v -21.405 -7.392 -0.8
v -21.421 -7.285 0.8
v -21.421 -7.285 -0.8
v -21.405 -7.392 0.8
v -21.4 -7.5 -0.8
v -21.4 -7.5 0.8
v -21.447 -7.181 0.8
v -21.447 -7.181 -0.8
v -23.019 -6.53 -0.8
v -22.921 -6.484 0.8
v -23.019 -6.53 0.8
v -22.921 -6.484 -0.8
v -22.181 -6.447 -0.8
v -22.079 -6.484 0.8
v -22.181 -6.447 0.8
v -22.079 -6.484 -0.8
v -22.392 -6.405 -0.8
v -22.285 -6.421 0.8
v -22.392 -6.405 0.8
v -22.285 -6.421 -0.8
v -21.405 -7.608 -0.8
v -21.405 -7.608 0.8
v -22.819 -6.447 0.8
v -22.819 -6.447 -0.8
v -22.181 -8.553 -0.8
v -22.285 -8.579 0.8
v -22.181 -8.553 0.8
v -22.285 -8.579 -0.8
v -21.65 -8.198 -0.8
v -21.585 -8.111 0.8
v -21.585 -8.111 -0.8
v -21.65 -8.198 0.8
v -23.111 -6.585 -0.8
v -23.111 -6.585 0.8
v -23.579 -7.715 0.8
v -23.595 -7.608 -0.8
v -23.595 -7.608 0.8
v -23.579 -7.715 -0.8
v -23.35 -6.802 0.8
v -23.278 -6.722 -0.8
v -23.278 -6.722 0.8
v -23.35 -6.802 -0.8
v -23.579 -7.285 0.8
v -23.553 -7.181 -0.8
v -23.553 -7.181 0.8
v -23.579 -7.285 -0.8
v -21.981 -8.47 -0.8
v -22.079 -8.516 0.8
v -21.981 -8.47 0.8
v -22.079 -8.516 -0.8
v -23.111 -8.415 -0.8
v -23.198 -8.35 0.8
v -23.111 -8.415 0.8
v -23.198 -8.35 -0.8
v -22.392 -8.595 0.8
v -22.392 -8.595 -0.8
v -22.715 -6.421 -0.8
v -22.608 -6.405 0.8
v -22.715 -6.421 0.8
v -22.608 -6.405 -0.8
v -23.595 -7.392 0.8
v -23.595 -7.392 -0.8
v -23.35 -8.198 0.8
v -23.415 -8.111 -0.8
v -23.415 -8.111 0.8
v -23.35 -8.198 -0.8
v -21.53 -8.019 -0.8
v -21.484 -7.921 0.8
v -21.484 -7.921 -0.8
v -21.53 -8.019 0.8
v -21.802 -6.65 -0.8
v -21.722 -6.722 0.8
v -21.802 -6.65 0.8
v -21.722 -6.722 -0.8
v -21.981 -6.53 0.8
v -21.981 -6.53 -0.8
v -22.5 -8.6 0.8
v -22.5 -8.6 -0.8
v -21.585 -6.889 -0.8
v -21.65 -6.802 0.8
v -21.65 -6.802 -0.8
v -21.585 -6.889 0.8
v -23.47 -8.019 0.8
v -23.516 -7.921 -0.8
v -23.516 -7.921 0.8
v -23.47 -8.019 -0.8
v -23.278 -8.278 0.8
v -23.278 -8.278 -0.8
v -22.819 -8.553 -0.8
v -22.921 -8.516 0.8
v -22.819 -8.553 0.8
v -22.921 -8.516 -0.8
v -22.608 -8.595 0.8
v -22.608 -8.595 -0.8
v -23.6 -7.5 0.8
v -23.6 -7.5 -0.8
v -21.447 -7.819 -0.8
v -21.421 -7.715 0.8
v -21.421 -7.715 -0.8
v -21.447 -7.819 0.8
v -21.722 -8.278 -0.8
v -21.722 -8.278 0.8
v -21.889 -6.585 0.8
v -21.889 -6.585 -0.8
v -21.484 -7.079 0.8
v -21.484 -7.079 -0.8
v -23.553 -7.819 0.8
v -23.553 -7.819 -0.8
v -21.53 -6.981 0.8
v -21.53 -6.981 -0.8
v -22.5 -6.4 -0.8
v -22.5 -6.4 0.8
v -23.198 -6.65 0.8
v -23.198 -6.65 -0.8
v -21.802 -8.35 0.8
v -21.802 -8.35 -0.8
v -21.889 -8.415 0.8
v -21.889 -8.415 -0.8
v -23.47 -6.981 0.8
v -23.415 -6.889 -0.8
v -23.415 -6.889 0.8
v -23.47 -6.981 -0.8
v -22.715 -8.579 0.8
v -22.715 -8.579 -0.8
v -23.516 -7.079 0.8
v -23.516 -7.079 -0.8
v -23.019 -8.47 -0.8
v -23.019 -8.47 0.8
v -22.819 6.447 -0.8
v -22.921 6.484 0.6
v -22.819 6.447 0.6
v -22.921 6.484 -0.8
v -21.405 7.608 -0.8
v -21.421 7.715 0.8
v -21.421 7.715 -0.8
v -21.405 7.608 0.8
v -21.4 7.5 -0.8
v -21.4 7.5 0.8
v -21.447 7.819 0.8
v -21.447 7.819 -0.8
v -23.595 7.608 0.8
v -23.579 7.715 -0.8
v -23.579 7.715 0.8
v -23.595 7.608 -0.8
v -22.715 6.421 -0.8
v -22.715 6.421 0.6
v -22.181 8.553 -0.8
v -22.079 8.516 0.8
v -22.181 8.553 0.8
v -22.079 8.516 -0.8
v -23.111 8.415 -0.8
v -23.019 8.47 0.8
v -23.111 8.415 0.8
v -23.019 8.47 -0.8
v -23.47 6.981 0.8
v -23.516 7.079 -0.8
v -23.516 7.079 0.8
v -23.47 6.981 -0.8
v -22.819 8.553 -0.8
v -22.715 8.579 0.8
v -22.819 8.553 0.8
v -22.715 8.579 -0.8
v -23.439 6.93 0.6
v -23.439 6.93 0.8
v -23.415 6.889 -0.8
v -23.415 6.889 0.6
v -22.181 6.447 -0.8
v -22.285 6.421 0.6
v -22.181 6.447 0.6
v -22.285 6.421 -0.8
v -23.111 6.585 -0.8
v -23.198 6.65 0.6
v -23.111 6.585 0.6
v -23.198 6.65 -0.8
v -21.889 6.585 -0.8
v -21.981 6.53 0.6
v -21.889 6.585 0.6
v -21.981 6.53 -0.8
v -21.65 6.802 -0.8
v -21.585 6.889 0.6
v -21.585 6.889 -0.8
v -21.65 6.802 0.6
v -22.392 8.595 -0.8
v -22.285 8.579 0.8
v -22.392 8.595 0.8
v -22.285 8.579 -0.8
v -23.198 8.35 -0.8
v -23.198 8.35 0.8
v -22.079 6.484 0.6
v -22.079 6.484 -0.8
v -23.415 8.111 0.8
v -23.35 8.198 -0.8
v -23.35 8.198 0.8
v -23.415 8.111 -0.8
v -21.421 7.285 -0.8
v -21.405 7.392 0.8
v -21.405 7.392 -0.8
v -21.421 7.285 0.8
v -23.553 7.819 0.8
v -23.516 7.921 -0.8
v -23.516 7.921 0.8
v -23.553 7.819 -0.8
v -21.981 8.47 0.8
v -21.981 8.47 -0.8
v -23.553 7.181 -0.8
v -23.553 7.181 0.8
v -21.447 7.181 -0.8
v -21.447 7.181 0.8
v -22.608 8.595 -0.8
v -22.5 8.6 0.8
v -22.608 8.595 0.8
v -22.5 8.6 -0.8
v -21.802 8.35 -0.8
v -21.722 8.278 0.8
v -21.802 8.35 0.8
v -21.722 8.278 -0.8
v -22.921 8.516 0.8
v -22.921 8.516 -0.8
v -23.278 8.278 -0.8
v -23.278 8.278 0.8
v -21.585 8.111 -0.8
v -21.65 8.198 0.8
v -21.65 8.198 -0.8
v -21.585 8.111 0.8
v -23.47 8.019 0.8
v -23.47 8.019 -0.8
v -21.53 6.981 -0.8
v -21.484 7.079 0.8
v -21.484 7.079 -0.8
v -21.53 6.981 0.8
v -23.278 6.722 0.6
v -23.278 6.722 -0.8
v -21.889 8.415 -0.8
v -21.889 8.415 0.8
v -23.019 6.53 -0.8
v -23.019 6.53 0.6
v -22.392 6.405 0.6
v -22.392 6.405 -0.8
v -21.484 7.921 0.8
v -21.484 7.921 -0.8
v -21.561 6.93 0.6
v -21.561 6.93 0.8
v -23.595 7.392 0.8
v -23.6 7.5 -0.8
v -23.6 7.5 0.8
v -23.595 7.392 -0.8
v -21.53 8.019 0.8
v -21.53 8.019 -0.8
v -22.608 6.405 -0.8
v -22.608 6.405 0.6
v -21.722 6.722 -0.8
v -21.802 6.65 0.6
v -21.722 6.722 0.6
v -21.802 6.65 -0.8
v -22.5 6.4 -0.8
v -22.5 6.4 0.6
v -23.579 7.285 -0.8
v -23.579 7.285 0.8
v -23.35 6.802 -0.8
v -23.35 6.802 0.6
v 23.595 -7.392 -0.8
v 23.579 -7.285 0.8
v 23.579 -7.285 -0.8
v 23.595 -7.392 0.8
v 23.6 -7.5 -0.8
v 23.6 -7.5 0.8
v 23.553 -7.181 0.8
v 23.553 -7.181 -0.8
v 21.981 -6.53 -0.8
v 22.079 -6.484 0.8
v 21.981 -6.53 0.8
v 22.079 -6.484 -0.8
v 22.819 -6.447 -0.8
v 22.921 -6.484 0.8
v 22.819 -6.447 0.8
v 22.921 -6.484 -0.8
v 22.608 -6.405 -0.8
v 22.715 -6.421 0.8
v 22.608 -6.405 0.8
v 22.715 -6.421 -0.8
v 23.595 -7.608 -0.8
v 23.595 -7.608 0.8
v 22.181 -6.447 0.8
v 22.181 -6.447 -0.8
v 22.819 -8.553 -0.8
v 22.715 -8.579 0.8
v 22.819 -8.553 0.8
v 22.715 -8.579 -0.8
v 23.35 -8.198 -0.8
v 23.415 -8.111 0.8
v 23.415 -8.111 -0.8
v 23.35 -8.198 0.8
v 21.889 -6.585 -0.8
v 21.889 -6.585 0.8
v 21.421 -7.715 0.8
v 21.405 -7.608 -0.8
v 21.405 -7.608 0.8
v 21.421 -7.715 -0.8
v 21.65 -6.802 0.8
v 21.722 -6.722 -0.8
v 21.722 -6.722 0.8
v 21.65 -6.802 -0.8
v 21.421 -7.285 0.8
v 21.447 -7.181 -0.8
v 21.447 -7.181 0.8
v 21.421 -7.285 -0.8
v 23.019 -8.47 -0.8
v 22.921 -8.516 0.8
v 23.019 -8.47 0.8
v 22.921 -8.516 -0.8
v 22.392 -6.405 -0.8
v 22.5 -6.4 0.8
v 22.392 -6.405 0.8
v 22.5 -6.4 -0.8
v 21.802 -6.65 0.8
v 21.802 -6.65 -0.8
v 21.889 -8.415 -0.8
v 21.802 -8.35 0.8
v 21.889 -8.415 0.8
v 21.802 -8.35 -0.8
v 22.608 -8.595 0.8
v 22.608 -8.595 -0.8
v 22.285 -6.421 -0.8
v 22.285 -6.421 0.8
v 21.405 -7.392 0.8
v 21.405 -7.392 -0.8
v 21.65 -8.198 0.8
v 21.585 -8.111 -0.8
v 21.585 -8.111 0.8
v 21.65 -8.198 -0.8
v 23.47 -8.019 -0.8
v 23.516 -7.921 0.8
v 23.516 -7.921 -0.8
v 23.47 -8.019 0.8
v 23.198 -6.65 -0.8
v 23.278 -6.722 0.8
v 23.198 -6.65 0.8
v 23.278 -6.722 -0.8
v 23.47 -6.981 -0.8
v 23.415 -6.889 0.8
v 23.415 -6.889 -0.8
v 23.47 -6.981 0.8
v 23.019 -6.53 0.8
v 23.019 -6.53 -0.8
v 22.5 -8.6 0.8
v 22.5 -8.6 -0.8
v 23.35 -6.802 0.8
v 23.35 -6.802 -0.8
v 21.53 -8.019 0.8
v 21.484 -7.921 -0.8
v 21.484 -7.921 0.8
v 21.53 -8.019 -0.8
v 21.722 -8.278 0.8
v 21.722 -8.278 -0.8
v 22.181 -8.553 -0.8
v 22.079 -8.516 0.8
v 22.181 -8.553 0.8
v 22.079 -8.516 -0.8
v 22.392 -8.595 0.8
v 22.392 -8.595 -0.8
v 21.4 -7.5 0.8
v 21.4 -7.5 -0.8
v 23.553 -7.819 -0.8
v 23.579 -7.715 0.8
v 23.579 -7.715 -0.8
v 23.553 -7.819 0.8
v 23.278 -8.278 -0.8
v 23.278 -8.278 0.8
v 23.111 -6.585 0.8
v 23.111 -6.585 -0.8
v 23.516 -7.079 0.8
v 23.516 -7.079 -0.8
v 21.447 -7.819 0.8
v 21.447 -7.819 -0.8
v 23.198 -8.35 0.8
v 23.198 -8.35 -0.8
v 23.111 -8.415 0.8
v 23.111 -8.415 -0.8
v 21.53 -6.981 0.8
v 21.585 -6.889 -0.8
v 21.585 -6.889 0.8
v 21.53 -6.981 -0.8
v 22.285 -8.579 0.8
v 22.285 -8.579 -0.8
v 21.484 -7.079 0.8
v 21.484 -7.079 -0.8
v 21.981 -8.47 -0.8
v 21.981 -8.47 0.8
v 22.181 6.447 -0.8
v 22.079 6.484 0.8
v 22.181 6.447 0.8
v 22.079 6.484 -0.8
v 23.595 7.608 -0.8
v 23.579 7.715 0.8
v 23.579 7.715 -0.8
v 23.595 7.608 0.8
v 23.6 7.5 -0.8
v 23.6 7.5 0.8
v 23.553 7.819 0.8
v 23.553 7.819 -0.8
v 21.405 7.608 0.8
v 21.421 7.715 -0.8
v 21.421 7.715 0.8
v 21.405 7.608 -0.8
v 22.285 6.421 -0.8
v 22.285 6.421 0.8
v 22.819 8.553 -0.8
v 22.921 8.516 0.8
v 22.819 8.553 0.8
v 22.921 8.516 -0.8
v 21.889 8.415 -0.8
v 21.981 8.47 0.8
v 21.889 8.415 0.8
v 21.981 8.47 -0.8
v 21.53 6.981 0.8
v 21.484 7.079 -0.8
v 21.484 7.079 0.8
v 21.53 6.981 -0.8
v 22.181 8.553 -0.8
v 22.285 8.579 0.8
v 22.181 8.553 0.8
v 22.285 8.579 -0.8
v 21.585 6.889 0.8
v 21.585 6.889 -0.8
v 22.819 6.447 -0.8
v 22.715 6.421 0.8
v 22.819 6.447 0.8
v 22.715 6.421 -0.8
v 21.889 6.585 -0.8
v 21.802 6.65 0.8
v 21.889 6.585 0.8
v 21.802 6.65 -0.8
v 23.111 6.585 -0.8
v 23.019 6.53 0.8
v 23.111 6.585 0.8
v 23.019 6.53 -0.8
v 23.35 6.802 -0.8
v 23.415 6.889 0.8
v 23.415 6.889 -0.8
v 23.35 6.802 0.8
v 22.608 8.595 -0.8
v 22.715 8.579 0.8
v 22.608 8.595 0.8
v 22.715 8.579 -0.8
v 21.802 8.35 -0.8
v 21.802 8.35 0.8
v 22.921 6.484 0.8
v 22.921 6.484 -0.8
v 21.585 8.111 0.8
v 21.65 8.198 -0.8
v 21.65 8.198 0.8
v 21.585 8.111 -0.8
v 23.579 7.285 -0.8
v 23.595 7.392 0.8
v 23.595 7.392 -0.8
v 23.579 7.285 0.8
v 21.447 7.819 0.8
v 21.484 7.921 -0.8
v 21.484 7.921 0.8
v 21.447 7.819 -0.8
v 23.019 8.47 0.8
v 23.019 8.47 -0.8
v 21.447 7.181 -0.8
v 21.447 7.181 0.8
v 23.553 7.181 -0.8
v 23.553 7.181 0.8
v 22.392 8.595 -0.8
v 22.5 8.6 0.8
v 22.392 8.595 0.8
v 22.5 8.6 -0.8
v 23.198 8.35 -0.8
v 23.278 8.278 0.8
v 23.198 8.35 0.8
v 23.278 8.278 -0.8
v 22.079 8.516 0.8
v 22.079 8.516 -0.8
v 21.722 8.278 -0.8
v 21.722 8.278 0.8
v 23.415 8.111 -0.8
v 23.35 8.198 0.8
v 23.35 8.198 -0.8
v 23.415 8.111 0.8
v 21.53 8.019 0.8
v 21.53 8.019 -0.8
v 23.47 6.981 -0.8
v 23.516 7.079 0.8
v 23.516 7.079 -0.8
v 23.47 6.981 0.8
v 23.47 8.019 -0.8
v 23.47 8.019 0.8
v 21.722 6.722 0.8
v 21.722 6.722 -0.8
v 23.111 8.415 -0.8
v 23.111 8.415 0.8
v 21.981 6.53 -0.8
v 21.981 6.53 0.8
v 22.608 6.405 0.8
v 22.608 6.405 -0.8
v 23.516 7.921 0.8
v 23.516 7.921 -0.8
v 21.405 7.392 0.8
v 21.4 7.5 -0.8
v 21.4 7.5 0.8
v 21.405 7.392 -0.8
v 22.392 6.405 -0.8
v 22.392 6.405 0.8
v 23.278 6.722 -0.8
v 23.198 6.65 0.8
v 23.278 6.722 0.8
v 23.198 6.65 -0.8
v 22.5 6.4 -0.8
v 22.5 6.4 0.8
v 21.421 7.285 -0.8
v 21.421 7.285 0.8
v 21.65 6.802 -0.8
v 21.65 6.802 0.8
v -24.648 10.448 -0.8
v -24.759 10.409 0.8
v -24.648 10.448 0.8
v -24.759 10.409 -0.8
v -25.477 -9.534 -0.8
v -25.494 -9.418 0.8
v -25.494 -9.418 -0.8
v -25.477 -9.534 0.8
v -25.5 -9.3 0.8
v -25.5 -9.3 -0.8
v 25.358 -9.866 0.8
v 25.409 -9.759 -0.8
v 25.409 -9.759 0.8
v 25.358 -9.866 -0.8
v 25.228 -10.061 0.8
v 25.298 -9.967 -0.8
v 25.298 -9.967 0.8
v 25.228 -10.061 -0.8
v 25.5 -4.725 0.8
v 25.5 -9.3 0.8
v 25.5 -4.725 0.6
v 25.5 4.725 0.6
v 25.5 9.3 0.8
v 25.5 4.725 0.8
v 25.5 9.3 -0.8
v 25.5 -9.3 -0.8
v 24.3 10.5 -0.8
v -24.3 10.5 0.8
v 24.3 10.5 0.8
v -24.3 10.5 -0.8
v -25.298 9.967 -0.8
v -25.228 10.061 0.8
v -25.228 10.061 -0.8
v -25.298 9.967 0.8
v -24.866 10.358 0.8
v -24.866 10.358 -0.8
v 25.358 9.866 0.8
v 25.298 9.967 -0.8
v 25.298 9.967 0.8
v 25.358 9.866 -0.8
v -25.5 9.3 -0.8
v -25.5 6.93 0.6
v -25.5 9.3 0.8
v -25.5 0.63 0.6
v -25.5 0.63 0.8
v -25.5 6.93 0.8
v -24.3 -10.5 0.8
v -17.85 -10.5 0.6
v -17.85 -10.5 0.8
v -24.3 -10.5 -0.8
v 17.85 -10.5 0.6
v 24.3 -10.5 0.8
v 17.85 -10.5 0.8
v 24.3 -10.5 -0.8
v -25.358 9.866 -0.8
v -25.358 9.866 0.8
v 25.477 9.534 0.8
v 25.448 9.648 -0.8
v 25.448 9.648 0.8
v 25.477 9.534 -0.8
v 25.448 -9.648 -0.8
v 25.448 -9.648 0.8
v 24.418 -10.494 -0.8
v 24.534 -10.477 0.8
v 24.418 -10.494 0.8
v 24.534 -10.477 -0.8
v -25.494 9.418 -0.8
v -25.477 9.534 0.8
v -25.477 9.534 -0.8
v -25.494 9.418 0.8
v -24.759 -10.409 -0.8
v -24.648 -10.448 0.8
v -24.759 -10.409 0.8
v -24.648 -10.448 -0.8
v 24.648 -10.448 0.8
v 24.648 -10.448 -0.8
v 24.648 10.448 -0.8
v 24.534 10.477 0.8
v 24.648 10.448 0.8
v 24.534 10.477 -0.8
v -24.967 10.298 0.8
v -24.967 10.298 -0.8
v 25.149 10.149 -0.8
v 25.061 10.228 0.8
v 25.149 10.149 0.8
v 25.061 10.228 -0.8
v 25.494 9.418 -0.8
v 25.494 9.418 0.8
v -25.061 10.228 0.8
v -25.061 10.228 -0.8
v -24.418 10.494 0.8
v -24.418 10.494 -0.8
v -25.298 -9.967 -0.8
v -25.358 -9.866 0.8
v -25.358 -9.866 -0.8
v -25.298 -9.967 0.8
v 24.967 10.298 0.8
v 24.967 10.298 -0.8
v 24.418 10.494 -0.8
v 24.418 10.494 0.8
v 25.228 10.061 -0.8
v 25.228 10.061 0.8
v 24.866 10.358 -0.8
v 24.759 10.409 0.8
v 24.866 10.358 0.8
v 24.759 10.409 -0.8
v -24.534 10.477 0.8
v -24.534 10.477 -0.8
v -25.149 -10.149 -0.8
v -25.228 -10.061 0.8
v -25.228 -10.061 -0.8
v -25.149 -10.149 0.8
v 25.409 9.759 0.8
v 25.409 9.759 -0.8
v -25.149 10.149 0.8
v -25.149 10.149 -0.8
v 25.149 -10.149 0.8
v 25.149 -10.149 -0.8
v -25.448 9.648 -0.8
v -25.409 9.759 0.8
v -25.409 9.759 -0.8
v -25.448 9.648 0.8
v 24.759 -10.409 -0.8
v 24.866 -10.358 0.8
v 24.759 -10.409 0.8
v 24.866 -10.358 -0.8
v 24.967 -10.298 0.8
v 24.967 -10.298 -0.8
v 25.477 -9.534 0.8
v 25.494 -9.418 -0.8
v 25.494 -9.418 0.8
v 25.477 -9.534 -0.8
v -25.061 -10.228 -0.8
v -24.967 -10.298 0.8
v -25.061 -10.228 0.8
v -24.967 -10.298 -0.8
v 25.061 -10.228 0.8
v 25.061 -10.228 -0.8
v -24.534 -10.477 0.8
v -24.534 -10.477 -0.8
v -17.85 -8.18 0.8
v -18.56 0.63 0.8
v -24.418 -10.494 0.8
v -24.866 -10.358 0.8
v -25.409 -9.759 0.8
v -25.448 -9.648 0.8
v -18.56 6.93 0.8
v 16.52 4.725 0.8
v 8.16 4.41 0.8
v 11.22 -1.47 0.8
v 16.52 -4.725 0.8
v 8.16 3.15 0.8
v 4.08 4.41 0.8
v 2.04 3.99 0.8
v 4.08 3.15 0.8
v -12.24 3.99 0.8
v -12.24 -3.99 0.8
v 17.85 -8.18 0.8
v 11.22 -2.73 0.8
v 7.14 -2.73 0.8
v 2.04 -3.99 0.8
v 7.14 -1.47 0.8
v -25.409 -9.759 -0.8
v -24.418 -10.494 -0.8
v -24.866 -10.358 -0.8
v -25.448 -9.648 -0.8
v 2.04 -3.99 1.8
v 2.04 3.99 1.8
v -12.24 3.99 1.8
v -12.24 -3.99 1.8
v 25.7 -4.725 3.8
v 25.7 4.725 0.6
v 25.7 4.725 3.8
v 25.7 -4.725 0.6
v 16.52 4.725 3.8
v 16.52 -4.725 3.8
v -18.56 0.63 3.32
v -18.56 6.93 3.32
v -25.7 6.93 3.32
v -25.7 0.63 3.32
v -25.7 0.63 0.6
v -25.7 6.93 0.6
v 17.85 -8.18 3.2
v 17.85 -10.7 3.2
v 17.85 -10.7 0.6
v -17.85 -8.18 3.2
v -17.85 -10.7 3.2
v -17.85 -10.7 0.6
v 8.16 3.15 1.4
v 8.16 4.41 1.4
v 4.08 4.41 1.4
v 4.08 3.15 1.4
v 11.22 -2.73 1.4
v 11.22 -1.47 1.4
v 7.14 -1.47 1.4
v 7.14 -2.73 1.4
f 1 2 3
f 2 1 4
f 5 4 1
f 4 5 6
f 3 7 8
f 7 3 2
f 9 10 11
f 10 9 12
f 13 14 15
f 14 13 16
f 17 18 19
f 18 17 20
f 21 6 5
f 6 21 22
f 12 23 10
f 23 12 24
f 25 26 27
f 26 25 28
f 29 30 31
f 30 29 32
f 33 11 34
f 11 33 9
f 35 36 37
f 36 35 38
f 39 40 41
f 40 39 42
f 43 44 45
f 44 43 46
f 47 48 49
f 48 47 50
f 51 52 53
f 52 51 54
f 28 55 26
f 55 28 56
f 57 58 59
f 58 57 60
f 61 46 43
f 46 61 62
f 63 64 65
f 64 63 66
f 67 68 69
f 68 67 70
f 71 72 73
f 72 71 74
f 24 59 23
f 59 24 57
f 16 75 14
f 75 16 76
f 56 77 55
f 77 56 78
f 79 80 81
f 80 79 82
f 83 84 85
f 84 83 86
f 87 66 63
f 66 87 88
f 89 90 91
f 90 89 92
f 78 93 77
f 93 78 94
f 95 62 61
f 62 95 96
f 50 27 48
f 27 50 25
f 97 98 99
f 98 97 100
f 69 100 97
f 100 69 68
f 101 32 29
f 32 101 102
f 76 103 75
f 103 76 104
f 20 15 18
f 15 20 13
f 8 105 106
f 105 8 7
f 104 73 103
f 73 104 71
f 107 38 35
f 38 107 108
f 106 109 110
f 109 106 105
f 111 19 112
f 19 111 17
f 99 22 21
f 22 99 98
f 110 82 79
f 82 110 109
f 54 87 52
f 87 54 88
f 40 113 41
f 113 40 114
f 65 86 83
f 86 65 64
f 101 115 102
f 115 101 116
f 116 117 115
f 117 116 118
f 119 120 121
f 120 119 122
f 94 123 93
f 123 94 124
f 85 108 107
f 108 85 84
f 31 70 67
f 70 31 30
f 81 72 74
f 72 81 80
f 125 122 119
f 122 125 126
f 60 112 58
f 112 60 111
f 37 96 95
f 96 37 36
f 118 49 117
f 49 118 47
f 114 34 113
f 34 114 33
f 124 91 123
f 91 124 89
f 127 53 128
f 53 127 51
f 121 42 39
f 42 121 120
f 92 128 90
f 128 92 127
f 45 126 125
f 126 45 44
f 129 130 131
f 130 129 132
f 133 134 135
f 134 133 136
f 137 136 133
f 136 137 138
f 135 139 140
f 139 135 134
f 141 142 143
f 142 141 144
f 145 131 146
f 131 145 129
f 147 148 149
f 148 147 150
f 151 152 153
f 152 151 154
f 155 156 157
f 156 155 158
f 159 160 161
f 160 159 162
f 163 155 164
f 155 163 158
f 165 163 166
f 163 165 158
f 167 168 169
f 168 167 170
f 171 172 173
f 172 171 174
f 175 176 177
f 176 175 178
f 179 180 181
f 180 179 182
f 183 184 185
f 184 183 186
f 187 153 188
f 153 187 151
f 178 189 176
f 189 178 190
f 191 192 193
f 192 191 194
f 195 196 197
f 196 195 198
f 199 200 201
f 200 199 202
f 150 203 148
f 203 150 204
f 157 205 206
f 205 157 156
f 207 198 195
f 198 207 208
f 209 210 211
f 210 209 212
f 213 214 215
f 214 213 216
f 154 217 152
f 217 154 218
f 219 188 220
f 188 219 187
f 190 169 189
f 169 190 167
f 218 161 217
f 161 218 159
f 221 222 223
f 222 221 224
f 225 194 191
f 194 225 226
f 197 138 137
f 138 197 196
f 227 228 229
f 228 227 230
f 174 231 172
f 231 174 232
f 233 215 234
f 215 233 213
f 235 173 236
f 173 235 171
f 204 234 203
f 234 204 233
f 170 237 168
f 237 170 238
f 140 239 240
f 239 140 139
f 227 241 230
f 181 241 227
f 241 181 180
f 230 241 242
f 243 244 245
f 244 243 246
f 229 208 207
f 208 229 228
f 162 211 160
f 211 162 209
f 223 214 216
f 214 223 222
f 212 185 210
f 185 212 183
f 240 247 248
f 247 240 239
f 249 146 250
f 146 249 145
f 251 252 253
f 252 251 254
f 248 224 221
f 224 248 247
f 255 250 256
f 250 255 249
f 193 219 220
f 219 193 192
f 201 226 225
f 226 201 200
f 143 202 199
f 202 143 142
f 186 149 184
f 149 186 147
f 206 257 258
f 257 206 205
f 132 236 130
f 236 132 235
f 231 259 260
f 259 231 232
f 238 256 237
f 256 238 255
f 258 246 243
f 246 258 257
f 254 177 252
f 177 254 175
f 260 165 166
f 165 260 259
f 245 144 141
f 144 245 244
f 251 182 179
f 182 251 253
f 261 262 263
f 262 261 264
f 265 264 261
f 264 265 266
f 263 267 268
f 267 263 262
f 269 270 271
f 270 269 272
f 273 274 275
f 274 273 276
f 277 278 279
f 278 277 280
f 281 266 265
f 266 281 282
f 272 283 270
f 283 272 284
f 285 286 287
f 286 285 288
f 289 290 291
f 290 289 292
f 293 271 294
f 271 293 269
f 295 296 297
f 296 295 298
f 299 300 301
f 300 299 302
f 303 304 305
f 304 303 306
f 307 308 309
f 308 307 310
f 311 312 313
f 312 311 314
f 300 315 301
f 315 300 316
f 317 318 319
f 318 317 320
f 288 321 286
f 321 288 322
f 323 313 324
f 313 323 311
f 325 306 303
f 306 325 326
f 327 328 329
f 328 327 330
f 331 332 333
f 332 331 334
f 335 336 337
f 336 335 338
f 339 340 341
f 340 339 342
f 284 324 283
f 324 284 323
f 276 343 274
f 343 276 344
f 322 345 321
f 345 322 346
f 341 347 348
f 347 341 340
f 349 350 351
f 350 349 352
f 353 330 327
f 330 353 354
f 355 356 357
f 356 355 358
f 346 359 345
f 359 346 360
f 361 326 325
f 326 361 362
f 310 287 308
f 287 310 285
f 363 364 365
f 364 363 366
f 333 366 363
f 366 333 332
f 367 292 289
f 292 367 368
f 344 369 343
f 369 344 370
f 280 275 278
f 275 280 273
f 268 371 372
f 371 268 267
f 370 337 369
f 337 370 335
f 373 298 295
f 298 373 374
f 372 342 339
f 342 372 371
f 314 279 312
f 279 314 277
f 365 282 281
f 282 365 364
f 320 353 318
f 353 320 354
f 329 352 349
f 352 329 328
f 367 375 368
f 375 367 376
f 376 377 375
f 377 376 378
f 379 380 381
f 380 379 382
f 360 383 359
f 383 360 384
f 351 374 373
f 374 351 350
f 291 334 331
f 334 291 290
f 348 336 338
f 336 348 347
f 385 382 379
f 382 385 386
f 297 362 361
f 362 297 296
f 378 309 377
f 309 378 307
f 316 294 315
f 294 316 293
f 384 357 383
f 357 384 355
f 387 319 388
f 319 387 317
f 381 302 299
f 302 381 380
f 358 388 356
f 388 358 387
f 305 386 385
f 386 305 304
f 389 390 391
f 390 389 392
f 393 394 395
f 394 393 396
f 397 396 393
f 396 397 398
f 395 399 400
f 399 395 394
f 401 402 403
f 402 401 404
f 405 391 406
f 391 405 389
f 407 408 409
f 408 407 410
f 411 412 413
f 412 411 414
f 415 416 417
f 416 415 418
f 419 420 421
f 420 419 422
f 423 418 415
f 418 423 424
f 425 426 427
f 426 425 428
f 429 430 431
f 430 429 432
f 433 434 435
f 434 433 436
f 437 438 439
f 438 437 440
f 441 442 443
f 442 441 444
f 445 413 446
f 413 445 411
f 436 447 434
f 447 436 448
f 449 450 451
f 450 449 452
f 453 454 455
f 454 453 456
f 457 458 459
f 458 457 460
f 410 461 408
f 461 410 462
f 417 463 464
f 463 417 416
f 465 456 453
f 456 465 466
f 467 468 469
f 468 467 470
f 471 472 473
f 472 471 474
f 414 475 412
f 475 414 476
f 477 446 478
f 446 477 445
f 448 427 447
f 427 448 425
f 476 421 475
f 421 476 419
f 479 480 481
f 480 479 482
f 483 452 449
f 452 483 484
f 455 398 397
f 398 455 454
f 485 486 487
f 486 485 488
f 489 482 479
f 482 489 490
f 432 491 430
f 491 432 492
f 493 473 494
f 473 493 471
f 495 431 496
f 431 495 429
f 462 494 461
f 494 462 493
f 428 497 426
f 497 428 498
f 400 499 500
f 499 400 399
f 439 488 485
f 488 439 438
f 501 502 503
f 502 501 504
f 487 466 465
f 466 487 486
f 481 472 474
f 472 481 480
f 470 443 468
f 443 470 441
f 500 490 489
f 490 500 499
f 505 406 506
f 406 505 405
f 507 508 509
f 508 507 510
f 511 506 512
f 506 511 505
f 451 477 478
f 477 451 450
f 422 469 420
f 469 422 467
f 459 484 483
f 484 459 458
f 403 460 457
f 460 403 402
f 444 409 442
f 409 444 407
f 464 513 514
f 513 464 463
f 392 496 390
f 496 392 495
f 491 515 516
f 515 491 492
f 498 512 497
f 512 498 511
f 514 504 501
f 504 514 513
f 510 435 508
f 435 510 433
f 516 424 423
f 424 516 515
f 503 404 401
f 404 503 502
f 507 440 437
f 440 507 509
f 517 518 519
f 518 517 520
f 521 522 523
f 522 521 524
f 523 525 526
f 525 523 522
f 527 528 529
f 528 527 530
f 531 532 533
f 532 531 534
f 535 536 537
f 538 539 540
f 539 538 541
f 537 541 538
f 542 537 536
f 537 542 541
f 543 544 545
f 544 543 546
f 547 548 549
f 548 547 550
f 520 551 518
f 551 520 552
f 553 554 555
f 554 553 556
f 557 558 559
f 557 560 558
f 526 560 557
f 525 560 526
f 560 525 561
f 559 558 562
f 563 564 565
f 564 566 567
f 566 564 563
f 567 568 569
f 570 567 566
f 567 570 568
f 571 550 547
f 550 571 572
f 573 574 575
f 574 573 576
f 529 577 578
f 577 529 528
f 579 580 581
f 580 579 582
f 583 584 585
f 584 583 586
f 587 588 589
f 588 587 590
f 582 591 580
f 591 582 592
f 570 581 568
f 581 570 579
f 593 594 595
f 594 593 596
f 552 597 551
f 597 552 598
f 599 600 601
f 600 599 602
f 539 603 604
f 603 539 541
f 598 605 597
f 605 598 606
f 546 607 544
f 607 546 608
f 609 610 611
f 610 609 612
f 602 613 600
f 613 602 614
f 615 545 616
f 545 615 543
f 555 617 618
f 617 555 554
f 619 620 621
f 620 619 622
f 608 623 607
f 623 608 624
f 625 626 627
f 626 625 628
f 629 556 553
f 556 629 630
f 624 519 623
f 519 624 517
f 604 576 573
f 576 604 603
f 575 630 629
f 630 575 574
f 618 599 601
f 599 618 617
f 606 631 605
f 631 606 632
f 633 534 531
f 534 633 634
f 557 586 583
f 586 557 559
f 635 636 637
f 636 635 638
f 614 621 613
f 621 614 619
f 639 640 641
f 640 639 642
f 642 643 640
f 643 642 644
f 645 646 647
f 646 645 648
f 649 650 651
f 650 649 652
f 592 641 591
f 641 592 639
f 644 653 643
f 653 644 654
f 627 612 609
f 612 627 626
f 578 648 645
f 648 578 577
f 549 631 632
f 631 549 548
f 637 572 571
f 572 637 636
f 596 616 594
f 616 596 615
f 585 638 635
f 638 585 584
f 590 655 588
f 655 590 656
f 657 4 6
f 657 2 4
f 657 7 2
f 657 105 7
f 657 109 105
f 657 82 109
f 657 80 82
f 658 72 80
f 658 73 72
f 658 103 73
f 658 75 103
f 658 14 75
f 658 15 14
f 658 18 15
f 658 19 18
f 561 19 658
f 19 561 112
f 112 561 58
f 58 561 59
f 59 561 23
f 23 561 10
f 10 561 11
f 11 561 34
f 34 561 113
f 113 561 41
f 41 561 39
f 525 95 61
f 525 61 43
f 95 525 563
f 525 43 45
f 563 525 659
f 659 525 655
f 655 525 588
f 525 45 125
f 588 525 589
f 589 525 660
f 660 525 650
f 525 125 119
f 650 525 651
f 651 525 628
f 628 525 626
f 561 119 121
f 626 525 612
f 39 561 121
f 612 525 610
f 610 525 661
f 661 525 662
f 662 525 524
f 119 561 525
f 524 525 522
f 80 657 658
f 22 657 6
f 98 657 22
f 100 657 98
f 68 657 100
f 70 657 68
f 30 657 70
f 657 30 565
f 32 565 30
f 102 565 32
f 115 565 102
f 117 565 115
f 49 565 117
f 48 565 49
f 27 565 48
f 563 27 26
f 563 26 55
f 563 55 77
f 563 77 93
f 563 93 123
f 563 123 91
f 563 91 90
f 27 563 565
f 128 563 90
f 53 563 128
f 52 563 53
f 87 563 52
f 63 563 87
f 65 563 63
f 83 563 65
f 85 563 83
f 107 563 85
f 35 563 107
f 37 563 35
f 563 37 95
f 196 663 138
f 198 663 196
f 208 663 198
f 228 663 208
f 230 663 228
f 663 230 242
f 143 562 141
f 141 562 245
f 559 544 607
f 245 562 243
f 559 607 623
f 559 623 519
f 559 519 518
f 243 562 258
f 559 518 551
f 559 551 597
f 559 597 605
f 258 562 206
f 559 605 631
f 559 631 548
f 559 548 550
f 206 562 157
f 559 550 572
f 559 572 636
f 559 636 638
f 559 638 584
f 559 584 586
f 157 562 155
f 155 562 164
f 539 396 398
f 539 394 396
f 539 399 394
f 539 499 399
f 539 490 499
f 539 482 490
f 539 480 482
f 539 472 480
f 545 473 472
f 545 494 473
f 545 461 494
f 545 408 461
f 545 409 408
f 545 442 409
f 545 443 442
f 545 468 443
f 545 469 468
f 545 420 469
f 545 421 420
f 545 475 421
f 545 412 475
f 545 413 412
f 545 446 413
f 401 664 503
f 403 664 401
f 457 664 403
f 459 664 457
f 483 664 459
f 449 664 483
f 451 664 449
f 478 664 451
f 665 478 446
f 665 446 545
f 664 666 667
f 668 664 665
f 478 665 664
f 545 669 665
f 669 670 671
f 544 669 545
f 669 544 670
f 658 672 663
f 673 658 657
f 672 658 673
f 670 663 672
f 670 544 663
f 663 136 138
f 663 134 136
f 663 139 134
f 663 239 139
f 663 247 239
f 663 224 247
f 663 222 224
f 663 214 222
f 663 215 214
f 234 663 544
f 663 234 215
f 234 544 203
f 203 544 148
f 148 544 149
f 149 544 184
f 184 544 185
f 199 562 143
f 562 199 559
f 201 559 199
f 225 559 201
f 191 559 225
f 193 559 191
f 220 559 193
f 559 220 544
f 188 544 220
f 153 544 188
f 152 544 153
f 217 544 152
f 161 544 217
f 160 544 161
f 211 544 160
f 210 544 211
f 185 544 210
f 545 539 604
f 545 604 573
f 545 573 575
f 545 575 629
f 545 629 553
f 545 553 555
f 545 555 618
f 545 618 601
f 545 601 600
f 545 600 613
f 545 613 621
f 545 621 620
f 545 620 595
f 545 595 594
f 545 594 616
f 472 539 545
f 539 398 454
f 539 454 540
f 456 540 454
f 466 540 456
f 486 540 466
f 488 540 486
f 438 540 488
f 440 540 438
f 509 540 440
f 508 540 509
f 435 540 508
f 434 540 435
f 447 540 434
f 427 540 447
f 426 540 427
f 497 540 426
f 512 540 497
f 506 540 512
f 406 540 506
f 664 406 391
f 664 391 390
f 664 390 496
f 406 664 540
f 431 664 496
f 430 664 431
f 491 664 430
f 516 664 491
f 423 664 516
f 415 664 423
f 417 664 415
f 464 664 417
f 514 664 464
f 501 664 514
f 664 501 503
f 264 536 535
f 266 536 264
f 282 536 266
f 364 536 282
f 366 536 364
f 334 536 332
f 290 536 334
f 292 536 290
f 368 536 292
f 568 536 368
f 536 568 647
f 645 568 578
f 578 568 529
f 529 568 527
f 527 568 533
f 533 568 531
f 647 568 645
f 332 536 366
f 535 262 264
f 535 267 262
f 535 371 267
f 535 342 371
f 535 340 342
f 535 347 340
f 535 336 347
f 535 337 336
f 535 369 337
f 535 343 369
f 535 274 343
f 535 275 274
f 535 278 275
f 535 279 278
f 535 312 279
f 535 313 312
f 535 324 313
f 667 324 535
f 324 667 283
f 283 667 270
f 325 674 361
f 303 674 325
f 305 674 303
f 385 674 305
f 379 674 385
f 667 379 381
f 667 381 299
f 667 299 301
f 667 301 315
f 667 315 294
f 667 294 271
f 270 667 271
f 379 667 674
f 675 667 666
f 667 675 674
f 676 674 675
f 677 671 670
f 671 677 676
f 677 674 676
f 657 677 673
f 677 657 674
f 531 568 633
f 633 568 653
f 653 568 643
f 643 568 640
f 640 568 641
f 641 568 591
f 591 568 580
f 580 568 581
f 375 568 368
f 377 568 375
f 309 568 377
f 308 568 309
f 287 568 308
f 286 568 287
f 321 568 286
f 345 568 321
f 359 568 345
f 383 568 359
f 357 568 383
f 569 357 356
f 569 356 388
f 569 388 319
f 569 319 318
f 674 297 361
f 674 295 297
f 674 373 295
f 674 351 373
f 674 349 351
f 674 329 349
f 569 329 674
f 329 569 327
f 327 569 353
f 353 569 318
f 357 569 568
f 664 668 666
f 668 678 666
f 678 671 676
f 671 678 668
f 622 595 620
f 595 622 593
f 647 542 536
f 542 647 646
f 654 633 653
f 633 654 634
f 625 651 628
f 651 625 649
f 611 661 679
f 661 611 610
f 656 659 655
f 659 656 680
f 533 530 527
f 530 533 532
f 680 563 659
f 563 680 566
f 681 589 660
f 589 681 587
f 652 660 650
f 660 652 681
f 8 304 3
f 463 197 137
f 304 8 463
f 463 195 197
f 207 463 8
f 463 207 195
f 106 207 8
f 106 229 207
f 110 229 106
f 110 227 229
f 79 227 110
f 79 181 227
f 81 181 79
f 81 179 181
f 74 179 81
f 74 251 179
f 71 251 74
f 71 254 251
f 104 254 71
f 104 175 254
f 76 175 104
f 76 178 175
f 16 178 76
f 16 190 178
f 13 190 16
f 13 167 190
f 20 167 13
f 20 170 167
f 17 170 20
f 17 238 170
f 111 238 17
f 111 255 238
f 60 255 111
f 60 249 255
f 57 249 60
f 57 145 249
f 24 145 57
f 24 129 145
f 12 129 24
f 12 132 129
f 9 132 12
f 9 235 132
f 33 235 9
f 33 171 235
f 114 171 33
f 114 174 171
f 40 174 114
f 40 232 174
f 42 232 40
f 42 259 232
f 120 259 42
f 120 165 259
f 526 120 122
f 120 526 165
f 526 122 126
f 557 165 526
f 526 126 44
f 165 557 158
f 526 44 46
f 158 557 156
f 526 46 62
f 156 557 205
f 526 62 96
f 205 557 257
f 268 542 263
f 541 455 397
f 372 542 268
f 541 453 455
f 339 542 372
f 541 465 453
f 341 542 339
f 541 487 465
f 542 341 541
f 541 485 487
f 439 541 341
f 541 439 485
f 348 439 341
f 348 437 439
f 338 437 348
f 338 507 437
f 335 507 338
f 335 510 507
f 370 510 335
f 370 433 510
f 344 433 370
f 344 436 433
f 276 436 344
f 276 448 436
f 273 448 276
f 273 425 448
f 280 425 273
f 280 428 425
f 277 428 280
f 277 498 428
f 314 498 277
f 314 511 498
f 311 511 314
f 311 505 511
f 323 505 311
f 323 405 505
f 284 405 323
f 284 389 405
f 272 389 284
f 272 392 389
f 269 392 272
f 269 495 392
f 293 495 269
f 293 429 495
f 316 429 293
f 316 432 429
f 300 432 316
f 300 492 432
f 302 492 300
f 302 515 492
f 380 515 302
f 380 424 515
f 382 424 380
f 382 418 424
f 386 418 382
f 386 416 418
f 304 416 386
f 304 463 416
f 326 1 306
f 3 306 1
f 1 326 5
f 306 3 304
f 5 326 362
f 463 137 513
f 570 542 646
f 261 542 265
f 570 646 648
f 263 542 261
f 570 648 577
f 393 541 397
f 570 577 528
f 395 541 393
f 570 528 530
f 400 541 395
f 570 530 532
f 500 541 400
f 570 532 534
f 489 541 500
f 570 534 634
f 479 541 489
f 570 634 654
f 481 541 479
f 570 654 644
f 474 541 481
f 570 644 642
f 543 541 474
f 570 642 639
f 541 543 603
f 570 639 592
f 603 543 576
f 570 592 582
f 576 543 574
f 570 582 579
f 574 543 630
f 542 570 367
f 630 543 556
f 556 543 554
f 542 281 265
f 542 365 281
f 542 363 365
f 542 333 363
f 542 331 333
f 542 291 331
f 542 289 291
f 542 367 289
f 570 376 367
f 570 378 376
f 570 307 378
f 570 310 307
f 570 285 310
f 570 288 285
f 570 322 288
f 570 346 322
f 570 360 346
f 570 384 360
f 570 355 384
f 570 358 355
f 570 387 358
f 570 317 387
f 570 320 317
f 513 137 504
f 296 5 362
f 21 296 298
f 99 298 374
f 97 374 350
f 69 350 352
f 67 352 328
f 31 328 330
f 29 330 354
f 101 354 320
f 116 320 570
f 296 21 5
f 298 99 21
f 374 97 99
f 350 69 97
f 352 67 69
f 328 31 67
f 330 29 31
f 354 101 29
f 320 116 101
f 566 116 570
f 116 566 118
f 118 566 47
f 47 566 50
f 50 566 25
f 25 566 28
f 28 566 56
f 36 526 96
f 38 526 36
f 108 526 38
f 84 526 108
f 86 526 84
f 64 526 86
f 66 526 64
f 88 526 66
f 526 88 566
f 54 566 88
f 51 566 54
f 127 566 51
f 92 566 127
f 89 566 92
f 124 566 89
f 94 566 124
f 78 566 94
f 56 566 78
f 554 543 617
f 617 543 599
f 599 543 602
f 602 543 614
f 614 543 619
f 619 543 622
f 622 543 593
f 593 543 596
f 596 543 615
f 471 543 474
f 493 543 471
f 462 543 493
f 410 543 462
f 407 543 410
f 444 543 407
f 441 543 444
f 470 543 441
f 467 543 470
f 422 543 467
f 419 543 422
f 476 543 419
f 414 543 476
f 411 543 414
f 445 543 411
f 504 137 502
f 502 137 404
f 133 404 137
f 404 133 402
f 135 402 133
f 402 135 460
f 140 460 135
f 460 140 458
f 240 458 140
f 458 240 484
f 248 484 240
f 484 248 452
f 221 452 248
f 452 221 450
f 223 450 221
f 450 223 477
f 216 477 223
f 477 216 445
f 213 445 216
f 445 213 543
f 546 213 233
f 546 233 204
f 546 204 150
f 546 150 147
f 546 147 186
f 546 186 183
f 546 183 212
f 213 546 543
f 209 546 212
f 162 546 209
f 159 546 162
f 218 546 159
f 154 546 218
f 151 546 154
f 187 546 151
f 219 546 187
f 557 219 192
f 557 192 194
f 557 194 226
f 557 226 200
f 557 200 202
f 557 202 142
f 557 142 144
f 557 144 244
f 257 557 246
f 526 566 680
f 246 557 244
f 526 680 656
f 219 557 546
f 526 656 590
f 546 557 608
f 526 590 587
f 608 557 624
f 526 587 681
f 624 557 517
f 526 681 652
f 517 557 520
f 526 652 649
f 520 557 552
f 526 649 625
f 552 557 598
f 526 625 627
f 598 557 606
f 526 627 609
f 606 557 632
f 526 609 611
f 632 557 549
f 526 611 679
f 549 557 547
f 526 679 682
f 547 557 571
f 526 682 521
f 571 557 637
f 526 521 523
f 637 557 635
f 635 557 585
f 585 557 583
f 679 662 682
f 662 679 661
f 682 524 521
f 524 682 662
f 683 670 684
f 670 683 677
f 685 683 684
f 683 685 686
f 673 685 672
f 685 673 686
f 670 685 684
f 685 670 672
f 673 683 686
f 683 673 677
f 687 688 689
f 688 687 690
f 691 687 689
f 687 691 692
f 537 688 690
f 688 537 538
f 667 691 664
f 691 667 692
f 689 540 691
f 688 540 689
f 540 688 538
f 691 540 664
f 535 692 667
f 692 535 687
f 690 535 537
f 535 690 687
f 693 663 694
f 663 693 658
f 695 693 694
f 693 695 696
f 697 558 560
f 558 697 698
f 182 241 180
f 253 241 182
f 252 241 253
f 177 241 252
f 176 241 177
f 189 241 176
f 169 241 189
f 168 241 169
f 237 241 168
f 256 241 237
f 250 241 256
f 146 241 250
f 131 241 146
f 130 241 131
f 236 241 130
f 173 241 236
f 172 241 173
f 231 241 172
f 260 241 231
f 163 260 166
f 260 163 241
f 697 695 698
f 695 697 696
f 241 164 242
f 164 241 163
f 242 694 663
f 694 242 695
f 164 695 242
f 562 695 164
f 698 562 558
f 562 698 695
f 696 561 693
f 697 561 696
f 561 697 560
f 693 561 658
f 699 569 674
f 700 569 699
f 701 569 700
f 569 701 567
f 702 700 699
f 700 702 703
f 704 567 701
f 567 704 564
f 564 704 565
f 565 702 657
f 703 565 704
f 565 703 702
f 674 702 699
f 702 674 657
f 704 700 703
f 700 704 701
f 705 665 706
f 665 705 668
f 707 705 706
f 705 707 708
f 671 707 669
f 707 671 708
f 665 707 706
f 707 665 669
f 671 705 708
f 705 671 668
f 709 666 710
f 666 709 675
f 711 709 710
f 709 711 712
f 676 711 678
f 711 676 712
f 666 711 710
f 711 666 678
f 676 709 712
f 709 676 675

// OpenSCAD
$fn = 64;

// Target board dimensions (mm)
pcb_L = 51.0;
pcb_W = 21.0;
pcb_T = 1.6;

// Detail parameters (kept proportional; all placements are formula-based)
corner_r = 1.2;          // rounded corner radius
hole_d   = 2.2;          // mounting hole diameter
hole_edge_clear = 3.0;   // hole center offset from each edge

// Component heights (above PCB)
chip_h   = 1.2;
conn_h   = 3.2;
header_h = 2.6;

// Small overlap to guarantee watertight unions
ov = 0.2;

// ---------- Helpers ----------
module rounded_rect_2d(L, W, r) {
    // 2D rounded rectangle centered at origin
    hull() {
        for (sx = [-1, 1], sy = [-1, 1])
            translate([sx*(L/2 - r), sy*(W/2 - r)])
                circle(r=r);
    }
}

module pcb_plate() {
    // PCB with rounded corners and 4 mounting holes
    difference() {
        linear_extrude(height=pcb_T, center=true)
            rounded_rect_2d(pcb_L, pcb_W, corner_r);

        // Mounting holes (through)
        for (sx = [-1, 1], sy = [-1, 1]) {
            translate([sx*(pcb_L/2 - hole_edge_clear), sy*(pcb_W/2 - hole_edge_clear), 0])
                cylinder(h=pcb_T + 2, d=hole_d, center=true);
        }
    }
}

module top_components() {
    // All components are placed so their bottoms slightly overlap into the PCB
    z0 = pcb_T/2;

    union() {
        // Main IC
        ic_L = pcb_L * 0.28;
        ic_W = pcb_W * 0.38;
        translate([-(pcb_L*0.10), 0, z0 + chip_h/2 - ov])
            cube([ic_L, ic_W, chip_h], center=true);

        // USB-like connector on +X edge
        usb_L = pcb_L * 0.18;
        usb_W = pcb_W * 0.45;
        usb_H = conn_h;
        translate([pcb_L/2 - usb_L/2 + ov, 0, z0 + usb_H/2 - ov])
            cube([usb_L, usb_W, usb_H], center=true);

        // Small connector on -X edge
        pwr_L = pcb_L * 0.14;
        pwr_W = pcb_W * 0.30;
        pwr_H = conn_h * 0.85;
        translate([-(pcb_L/2 - pwr_L/2 + ov), pcb_W*0.18, z0 + pwr_H/2 - ov])
            cube([pwr_L, pwr_W, pwr_H], center=true);

        // Pin header along -Y edge
        hdr_L = pcb_L * 0.70;
        hdr_W = pcb_W * 0.12;
        hdr_H = header_h;
        translate([0, -(pcb_W/2 - hdr_W/2 + ov), z0 + hdr_H/2 - ov])
            cube([hdr_L, hdr_W, hdr_H], center=true);

        // A couple of small passives
        smd_L = pcb_L * 0.08;
        smd_W = pcb_W * 0.06;
        smd_H = 0.8;
        translate([pcb_L*0.12, pcb_W*0.18, z0 + smd_H/2 - ov])
            cube([smd_L, smd_W, smd_H], center=true);
        translate([pcb_L*0.18, -pcb_W*0.10, z0 + smd_H/2 - ov])
            cube([smd_L, smd_W, smd_H], center=true);
    }
}

// ---------- Final Model (ONE connected solid) ----------
module single_board_computer() {
    union() {
        color([0.0, 0.4, 0.2]) pcb_plate();
        color([0.15, 0.15, 0.15]) top_components();
    }
}

single_board_computer();
